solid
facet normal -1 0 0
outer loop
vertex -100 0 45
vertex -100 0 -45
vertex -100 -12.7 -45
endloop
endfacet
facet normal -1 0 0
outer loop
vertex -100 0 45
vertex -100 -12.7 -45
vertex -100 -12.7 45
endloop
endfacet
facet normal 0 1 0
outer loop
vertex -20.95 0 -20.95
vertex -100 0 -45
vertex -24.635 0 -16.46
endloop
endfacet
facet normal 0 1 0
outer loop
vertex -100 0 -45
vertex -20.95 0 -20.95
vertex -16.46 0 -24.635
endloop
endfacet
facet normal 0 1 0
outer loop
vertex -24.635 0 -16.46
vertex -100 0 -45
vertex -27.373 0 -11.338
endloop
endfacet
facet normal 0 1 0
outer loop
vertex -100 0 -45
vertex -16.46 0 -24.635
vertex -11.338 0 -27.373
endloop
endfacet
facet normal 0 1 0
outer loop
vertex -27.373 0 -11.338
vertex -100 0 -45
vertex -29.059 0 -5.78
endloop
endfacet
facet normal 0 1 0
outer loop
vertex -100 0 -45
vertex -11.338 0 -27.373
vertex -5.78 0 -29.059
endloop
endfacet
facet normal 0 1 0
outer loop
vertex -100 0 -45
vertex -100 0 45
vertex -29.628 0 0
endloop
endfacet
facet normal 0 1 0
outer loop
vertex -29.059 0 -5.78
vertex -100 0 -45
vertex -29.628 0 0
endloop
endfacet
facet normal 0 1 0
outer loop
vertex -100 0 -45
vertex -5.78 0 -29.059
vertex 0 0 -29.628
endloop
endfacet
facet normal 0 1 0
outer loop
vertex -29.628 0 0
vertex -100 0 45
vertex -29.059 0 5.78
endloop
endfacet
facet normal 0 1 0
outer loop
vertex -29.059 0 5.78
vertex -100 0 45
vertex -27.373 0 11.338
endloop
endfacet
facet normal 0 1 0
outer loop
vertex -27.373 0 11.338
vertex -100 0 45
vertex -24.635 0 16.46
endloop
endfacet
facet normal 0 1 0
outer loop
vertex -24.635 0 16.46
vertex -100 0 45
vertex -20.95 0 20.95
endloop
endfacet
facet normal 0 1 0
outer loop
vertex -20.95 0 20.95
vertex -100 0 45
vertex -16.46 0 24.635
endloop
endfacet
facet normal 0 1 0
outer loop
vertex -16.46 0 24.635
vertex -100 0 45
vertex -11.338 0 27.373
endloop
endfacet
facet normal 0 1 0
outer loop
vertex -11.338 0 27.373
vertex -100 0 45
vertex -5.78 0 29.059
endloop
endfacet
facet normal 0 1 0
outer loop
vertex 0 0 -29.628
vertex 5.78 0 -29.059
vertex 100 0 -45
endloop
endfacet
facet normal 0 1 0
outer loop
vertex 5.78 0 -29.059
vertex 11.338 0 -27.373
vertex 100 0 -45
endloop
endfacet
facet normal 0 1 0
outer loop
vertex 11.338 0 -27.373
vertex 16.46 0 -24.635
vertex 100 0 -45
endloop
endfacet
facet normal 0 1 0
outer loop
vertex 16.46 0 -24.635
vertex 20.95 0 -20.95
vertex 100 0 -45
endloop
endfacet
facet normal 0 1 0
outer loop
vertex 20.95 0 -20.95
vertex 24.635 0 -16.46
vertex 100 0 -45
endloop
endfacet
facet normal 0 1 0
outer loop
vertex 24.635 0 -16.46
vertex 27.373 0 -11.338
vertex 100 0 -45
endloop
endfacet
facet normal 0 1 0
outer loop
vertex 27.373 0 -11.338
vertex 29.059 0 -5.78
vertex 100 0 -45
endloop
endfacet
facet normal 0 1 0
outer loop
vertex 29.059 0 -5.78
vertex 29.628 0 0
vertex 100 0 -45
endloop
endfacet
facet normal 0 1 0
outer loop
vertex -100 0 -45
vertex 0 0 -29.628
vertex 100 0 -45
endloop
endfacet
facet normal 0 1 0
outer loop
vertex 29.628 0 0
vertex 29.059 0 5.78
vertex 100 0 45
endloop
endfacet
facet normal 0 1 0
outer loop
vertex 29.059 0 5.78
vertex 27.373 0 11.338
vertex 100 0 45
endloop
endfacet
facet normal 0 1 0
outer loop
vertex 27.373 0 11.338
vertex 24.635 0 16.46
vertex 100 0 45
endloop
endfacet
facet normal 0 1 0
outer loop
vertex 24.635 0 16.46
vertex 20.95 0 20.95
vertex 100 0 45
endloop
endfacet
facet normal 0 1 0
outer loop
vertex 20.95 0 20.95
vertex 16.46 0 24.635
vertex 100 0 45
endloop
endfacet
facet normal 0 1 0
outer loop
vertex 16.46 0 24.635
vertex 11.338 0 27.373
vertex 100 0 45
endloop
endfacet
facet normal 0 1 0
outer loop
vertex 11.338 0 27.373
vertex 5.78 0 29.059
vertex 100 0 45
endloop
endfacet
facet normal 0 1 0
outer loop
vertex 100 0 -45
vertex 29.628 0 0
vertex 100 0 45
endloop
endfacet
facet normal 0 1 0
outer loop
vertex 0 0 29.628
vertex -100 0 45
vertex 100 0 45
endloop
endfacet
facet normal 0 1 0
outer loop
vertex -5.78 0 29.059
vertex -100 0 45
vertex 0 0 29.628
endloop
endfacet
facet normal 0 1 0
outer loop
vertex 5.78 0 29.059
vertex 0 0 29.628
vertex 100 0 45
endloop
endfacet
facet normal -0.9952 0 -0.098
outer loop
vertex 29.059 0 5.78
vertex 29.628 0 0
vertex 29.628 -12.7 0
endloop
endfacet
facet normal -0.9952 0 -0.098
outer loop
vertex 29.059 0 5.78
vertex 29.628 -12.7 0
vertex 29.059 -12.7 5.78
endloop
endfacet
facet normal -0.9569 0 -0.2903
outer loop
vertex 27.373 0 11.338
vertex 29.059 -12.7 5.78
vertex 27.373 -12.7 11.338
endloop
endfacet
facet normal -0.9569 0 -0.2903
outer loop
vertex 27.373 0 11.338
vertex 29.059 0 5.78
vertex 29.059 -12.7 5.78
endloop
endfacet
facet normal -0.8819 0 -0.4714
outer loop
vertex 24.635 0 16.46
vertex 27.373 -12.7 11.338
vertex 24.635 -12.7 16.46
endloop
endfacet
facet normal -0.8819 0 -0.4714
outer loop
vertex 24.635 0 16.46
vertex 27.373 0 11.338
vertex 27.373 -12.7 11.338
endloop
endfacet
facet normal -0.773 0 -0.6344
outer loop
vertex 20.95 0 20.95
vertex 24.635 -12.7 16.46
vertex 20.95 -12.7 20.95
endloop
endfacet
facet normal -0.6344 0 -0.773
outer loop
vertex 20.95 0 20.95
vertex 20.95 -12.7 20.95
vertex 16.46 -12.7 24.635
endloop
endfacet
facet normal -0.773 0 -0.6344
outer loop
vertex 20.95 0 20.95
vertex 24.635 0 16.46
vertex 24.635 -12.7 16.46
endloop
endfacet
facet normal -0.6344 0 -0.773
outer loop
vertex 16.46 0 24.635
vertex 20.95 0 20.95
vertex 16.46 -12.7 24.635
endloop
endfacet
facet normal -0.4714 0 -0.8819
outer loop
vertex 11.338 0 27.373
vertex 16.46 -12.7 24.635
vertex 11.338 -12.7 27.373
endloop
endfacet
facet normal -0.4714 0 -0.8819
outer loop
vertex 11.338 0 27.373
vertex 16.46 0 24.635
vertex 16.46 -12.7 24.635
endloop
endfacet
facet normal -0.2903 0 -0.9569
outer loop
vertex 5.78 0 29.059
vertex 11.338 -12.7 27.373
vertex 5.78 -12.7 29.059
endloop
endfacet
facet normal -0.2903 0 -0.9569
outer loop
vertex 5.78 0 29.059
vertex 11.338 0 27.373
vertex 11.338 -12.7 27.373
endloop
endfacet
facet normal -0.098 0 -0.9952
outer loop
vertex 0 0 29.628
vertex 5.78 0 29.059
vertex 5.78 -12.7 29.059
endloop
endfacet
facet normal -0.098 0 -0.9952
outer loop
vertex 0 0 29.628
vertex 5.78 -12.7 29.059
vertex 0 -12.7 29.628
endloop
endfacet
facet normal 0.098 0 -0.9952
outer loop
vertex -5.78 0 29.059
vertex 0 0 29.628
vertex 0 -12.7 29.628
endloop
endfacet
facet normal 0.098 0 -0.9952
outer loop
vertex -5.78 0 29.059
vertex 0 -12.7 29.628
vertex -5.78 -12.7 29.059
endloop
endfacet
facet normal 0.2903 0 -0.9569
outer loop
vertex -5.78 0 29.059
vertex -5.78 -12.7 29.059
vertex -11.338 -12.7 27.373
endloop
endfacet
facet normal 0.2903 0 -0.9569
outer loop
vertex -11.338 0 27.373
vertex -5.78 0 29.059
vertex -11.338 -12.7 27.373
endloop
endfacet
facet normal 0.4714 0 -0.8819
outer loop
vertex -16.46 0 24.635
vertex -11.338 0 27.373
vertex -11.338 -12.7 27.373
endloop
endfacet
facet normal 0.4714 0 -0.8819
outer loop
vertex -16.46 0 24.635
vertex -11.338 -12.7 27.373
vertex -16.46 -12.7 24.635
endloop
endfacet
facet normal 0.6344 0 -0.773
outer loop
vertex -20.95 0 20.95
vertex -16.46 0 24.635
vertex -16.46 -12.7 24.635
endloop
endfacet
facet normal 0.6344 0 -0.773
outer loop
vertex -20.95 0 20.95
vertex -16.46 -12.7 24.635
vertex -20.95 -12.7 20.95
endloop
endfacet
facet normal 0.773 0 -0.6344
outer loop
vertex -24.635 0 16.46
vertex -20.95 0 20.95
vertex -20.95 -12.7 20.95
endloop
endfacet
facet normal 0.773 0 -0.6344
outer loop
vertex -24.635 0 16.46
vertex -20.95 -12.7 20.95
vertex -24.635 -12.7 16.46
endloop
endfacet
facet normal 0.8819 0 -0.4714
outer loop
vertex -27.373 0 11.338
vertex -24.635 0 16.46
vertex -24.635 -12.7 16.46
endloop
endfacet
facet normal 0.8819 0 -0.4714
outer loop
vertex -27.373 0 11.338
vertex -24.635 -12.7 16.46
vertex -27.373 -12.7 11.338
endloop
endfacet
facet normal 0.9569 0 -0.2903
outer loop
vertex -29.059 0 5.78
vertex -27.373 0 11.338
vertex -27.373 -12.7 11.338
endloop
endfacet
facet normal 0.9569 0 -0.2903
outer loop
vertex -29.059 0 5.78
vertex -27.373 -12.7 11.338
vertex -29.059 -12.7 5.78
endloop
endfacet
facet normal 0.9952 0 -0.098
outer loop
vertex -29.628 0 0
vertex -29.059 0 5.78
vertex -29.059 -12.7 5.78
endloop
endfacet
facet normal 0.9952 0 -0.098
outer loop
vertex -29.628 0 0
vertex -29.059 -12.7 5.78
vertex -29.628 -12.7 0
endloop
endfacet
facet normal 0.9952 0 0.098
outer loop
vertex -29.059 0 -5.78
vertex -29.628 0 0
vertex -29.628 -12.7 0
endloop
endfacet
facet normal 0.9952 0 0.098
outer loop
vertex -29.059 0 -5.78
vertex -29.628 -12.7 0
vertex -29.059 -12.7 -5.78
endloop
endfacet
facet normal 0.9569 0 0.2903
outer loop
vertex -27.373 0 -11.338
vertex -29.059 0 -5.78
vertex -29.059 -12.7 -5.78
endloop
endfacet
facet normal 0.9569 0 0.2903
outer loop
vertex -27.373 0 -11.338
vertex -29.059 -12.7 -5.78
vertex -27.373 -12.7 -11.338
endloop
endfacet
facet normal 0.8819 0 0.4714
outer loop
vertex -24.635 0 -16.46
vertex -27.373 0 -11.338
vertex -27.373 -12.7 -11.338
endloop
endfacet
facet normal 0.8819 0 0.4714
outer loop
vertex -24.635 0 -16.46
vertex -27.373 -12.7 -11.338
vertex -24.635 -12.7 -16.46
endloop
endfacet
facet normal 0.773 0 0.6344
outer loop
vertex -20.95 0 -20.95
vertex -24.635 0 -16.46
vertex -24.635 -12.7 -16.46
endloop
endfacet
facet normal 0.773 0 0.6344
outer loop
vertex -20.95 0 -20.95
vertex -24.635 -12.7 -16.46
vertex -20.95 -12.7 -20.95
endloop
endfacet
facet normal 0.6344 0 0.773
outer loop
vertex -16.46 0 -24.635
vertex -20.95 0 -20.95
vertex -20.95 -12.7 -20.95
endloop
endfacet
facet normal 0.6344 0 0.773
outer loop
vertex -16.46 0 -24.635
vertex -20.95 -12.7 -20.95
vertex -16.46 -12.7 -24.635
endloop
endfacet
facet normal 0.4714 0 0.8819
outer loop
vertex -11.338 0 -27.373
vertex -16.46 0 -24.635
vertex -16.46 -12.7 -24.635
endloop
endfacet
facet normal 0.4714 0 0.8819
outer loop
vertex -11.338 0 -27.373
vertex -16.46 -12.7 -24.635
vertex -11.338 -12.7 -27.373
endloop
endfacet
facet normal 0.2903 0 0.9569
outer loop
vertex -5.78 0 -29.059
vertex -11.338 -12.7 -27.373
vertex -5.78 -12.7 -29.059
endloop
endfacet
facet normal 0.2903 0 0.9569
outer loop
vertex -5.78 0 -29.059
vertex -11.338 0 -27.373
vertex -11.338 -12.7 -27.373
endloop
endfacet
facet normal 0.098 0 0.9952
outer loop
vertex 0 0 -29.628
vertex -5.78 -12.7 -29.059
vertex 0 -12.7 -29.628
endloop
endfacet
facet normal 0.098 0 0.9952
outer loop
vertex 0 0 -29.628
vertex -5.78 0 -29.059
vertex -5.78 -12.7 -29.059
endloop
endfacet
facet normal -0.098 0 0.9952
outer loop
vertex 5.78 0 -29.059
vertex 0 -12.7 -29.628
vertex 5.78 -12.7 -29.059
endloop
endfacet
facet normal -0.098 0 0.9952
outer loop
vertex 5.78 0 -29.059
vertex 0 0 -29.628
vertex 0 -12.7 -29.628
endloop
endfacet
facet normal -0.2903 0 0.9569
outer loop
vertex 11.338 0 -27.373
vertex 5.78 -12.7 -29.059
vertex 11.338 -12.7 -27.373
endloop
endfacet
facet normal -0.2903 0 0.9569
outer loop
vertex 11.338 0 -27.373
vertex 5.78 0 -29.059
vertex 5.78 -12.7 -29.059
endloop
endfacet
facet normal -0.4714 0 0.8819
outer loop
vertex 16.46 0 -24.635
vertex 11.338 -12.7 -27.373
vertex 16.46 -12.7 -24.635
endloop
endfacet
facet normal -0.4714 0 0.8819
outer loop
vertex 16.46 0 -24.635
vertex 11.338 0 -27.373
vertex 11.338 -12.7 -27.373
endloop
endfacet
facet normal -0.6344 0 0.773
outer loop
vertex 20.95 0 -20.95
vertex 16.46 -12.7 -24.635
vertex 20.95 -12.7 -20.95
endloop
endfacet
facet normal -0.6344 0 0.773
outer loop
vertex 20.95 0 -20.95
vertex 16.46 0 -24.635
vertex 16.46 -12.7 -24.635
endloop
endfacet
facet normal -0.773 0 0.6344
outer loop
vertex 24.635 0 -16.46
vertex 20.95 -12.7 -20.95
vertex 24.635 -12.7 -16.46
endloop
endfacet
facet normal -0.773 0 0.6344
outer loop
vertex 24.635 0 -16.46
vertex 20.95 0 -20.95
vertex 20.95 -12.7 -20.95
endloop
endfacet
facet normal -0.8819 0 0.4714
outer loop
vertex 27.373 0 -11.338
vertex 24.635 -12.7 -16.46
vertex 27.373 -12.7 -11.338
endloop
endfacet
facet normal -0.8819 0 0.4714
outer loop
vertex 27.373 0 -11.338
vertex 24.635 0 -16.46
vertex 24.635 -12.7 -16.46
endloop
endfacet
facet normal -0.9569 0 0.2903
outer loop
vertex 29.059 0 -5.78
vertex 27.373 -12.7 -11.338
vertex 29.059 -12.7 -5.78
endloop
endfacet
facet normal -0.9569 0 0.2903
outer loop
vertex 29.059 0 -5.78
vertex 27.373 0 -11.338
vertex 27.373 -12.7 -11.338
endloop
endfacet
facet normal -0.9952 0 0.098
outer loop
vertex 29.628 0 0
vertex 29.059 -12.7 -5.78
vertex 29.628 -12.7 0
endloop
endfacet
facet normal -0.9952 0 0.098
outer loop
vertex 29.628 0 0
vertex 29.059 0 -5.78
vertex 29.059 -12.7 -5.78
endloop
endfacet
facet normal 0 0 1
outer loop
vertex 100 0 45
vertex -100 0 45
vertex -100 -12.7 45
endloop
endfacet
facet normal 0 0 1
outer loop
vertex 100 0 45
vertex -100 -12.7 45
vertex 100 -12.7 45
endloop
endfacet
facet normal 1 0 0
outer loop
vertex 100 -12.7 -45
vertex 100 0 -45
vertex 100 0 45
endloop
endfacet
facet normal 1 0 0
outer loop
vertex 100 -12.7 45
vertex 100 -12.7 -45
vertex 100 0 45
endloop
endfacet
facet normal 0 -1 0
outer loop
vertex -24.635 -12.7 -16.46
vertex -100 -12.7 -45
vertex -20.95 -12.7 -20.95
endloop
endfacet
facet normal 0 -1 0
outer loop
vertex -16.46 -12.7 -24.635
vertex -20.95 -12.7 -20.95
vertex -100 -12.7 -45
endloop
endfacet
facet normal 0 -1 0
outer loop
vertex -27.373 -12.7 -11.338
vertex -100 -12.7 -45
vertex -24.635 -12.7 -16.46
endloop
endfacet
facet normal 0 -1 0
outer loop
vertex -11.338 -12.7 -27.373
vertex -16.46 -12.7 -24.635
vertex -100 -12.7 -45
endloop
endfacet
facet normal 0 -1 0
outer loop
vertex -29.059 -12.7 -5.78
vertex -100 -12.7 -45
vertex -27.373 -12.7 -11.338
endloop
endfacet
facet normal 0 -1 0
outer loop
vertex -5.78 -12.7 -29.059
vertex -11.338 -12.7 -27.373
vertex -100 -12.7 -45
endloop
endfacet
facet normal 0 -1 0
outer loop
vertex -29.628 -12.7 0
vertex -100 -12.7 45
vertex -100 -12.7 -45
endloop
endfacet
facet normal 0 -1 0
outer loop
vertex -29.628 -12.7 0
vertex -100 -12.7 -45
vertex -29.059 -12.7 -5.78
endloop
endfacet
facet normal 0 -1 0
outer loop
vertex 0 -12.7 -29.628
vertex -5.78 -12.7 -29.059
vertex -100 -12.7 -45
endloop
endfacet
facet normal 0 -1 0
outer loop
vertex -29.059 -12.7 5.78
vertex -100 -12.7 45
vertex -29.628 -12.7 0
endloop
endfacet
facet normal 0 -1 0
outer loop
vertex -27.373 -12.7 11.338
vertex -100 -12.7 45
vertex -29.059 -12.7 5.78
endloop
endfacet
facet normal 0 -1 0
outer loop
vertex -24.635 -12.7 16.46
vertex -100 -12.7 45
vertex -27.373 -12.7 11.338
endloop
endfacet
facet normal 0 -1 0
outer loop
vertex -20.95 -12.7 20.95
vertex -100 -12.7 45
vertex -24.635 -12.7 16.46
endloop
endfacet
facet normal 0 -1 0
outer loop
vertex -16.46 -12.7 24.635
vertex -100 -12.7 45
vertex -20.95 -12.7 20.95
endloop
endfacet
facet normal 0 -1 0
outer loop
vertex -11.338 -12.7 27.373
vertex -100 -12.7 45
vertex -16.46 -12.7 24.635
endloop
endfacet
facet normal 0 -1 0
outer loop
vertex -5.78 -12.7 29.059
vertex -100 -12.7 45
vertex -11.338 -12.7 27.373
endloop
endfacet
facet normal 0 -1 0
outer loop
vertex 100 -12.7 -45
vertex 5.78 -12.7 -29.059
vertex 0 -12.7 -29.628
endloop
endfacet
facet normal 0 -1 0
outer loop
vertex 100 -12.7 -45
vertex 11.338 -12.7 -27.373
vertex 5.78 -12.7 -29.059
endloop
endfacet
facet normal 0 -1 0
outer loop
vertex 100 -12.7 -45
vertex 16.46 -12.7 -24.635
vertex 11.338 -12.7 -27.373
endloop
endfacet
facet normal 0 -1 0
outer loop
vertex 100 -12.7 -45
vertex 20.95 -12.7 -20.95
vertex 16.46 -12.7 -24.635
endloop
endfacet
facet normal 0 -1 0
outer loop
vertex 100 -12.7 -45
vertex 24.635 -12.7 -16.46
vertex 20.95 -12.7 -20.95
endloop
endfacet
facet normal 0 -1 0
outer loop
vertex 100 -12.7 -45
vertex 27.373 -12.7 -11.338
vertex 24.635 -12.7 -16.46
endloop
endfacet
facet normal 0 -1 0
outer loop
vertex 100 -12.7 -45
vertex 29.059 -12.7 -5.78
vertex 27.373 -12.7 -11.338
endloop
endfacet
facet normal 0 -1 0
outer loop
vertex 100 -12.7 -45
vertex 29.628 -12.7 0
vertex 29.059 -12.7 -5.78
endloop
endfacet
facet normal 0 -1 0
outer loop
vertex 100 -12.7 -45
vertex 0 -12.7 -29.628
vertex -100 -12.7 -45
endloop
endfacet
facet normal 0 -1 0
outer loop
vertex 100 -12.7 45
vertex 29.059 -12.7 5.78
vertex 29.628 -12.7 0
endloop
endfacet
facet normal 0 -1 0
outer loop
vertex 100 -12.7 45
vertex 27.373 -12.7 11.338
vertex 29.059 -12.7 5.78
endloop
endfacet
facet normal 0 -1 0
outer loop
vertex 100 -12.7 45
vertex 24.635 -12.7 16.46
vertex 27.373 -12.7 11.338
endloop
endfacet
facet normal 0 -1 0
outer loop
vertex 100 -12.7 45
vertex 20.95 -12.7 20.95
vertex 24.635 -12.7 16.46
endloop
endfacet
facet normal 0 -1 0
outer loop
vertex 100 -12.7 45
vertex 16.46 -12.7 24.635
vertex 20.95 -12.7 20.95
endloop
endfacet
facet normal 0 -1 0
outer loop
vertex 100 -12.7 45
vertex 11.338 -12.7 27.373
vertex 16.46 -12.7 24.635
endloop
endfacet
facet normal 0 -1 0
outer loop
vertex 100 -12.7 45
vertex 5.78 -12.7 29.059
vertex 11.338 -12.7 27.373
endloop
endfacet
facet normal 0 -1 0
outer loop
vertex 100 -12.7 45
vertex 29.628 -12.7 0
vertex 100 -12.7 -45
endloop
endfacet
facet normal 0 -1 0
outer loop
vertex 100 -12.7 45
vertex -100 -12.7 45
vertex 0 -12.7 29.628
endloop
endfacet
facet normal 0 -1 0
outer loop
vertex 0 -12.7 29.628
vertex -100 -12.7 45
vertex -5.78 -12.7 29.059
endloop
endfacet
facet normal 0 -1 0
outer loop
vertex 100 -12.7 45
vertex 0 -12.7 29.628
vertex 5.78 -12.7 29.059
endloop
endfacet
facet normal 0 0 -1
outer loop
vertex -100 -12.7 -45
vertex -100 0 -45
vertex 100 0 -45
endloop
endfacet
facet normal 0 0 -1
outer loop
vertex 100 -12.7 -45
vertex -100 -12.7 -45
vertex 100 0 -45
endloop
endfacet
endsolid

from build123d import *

# Parameters (mm, degrees)
F0_W     = 200
F0_H     = 90
F0_R     = 29.6278920172
F1_DEPTH = 38.1
F2_DEPTH = 25.4


# Not quite as in the source:
# - a feature names something its author has since deleted; it is built from what else it names


with BuildPart() as f1:
    # F0 (on Front) → F1 (new body)
    with BuildSketch(Plane.XZ):
        Rectangle(F0_W, F0_H)
        Circle(F0_R, mode=Mode.SUBTRACT)
    extrude(amount=F1_DEPTH)

    # F2 (cut): a face of the model
    f2_faces = [f1.faces().sort_by_distance(p)[0] for p in [
        (0, -38.1, -42.8068287801),
    ]]
    extrude(f2_faces, amount=-F2_DEPTH, mode=Mode.SUBTRACT)


solid = f1.part
